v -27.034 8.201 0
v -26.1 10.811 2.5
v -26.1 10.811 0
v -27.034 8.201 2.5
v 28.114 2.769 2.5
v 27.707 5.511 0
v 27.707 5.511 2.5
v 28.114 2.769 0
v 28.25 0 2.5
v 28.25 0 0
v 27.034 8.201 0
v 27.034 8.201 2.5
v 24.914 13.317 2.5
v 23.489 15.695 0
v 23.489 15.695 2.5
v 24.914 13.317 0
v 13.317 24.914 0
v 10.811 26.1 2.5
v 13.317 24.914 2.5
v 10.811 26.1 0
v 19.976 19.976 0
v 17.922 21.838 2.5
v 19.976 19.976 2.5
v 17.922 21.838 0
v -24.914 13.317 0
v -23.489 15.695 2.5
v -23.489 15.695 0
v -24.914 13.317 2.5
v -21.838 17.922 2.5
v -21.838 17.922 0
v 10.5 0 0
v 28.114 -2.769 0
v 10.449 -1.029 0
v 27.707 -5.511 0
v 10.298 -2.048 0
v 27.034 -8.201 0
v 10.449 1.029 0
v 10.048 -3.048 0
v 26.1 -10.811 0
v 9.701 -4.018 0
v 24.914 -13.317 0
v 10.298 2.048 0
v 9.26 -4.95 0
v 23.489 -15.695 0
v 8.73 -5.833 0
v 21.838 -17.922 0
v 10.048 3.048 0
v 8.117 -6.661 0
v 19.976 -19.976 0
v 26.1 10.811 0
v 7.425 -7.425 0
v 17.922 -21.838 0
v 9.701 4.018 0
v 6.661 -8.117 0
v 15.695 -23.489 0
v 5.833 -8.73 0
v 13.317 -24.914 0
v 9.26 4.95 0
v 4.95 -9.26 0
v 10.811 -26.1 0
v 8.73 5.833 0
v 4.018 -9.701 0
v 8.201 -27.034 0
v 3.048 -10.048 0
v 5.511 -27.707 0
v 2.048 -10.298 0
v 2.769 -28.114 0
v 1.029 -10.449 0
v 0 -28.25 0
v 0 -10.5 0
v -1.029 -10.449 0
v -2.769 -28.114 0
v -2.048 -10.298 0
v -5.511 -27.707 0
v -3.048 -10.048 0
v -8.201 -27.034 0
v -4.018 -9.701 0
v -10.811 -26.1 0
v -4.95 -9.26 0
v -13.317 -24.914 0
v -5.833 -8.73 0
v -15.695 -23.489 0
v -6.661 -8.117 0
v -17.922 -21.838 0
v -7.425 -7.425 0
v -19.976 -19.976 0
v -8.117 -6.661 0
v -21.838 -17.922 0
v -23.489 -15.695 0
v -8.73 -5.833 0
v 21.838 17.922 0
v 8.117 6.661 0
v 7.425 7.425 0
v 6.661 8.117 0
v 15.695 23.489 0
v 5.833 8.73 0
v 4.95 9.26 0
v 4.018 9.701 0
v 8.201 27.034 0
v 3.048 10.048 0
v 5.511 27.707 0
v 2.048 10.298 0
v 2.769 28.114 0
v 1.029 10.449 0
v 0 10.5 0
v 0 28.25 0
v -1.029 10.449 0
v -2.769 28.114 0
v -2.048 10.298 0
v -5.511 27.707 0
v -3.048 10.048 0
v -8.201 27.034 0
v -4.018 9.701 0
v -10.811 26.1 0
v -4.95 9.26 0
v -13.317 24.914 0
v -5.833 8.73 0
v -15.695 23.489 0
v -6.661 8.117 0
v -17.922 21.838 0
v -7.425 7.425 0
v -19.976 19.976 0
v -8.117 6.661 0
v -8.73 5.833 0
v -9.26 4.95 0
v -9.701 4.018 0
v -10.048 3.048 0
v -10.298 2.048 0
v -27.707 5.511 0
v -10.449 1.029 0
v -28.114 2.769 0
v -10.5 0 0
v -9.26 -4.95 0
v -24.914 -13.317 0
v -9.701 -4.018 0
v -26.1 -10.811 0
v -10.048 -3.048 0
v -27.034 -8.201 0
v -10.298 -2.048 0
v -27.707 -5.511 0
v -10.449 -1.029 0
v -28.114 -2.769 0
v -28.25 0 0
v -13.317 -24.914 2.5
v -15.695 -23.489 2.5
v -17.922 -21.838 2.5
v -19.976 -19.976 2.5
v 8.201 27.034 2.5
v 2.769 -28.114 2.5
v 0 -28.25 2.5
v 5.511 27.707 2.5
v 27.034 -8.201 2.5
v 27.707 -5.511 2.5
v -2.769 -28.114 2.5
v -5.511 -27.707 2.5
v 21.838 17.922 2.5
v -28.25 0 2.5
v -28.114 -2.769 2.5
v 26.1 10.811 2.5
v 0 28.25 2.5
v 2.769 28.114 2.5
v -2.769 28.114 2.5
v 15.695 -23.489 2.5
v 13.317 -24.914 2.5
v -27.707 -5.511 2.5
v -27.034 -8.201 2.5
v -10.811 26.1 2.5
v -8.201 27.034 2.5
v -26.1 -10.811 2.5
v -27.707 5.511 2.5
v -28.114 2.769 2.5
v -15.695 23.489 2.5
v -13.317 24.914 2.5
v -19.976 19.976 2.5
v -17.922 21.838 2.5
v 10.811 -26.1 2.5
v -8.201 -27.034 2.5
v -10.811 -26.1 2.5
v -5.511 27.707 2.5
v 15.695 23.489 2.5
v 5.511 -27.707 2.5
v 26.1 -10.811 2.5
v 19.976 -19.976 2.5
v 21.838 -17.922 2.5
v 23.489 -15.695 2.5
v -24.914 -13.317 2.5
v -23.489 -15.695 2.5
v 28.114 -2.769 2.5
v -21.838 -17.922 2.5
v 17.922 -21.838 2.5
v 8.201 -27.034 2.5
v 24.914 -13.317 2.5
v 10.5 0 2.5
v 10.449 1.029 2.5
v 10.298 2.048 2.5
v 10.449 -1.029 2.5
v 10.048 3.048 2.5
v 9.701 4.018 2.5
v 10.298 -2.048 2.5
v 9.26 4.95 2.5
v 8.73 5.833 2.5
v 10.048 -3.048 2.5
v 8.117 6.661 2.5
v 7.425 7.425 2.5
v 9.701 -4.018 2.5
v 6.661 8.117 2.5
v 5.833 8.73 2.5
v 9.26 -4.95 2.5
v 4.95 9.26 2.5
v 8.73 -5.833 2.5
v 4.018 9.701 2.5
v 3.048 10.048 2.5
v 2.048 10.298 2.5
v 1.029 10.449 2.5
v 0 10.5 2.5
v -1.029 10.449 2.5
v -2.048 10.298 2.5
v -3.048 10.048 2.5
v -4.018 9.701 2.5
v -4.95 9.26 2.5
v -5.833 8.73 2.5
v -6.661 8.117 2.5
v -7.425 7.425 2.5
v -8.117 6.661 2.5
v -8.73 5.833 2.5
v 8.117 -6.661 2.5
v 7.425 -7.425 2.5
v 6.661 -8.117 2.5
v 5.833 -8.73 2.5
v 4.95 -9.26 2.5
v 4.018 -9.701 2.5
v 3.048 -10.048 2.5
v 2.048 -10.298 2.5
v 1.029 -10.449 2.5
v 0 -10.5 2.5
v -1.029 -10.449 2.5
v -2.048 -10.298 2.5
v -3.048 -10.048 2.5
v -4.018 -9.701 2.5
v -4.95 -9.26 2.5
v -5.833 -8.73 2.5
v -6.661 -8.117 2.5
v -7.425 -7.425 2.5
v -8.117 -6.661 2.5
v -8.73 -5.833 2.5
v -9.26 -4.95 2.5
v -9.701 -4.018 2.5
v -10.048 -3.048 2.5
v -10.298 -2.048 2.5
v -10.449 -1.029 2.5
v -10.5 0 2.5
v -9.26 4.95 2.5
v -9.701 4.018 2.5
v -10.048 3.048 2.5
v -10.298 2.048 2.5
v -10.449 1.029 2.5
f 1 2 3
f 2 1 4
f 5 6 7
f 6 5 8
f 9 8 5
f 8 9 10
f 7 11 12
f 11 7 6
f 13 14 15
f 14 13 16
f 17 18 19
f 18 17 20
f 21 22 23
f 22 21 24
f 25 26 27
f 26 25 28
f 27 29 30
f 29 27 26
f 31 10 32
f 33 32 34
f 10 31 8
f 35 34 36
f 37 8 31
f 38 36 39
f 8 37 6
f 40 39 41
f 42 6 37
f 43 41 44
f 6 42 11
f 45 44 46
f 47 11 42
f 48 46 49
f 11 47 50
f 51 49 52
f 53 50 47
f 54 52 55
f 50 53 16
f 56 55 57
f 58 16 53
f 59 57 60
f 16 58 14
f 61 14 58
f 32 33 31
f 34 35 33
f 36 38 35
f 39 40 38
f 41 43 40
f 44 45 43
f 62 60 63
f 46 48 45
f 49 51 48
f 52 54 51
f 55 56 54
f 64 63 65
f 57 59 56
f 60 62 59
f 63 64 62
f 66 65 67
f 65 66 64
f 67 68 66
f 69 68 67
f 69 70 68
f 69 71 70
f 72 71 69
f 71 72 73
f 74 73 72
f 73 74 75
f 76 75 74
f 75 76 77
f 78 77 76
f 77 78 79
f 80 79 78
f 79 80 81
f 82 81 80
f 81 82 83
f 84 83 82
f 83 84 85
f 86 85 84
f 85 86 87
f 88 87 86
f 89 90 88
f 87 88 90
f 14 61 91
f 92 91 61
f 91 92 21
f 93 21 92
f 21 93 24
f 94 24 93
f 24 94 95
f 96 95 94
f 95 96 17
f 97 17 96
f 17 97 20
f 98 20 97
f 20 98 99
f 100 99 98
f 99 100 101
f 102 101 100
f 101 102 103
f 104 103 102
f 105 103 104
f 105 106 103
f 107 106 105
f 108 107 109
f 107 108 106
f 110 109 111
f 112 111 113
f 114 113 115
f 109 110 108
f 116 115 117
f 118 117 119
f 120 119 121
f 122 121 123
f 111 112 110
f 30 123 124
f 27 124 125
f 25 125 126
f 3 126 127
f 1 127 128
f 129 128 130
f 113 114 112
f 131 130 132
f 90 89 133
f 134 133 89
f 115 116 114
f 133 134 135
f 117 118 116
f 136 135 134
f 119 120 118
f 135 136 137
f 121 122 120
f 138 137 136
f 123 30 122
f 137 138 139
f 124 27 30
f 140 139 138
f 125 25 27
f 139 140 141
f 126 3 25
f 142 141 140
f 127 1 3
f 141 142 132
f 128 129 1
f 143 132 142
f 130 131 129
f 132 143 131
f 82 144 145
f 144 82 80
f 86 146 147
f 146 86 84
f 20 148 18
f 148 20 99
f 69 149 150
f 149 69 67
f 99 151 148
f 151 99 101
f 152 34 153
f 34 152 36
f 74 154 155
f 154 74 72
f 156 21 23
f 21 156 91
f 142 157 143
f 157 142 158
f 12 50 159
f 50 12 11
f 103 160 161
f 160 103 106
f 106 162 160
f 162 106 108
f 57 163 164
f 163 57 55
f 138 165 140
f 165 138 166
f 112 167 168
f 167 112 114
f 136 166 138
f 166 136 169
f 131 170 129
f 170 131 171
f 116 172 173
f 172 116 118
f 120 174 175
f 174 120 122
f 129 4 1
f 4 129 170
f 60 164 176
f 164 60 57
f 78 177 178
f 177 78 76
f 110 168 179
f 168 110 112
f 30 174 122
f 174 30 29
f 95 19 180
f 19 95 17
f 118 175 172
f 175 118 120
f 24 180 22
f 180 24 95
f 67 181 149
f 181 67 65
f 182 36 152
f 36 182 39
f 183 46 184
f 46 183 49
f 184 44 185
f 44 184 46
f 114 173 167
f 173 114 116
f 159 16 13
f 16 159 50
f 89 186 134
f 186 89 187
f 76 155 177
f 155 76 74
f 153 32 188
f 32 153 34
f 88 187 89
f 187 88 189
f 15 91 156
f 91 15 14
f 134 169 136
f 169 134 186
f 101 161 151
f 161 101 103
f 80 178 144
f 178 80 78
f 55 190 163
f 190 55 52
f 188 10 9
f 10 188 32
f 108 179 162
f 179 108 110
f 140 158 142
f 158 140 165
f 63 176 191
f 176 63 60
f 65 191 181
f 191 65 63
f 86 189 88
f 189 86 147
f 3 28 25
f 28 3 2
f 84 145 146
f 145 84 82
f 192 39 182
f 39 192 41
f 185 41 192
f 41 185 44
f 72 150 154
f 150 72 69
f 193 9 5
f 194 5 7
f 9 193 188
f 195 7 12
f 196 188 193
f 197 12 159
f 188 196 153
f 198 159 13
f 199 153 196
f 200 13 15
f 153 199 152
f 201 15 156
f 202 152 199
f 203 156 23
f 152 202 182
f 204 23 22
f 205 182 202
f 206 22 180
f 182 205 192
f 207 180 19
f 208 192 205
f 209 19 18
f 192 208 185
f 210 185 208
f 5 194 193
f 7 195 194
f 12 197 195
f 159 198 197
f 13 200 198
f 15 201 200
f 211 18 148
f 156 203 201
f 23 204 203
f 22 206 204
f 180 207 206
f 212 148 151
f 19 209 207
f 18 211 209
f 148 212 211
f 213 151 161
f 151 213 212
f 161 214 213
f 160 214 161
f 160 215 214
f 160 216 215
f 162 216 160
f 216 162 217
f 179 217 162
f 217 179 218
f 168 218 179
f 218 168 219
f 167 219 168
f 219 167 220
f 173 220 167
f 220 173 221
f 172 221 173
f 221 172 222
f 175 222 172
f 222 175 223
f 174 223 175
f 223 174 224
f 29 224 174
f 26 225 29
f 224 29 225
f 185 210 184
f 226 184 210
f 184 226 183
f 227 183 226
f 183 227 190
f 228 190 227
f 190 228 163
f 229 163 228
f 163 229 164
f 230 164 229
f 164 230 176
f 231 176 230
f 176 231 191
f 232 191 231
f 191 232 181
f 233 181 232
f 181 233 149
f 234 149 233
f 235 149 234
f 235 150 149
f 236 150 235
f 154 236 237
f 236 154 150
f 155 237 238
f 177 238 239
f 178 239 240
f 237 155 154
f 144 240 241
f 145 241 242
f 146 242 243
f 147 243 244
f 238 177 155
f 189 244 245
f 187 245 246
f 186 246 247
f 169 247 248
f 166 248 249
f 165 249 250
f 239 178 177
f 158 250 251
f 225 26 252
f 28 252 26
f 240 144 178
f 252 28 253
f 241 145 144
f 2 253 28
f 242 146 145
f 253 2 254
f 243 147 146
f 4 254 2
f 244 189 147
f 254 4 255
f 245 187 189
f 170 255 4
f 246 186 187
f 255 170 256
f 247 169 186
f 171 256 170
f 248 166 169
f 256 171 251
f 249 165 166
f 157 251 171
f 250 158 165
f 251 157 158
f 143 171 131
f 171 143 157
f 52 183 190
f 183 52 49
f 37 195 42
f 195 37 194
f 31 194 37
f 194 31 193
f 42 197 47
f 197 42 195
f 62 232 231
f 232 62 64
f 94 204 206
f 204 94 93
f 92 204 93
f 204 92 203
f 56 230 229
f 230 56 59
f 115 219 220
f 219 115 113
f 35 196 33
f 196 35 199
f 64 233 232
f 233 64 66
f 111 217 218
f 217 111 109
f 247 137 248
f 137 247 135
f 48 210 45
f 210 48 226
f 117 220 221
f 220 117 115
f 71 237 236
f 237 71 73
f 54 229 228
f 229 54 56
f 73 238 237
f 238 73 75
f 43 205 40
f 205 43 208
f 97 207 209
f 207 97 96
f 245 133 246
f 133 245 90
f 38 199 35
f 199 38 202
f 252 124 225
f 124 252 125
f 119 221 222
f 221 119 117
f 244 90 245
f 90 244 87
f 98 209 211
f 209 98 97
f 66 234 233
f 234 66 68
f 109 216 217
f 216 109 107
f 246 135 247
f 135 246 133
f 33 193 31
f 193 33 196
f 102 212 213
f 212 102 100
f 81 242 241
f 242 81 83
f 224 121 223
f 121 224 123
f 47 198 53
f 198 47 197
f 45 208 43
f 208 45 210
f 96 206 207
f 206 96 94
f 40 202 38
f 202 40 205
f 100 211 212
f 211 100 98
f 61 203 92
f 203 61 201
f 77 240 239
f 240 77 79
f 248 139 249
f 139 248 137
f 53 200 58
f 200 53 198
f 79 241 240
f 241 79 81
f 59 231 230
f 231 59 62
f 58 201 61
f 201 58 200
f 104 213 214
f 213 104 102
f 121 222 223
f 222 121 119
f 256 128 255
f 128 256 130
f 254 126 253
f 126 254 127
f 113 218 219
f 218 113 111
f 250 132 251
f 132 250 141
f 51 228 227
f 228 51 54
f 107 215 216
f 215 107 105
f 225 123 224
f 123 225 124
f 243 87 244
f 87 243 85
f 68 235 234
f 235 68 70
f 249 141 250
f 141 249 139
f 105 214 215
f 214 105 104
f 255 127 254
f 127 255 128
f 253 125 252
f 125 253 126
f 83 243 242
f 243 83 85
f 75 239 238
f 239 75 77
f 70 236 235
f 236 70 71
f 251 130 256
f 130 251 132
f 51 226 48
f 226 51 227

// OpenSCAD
$fn=64;

module
circletext(mytext,textsize=20,myfont="Arial",radius=100,thickness=1,degrees=360,top=true){
       
        chars=len(mytext)+1;
       
        for (i = [1:chars]) {
                        rotate([0,0,(top?1:-1)*(degrees/2-i*(degrees/chars))])
                        translate([0,(top?1:-1)*radius-(top?0:textsize/2),0])
                        //linear_extrude(thickness)
                        text(mytext[i-1],halign="center",font=myfont,size=textsize);
        }
}

height = 2.5;
inner_d = 20;
outer_d = 57.5;
kuttekant = 0.5;

difference() {
    cylinder(h=height,d=outer_d-kuttekant*2);
    cylinder(h=height,d=inner_d+kuttekant*2);
}




//circletext("My text goes here",textsize=20,degrees=160,top=true);

//circletext("Text can be underneath as well",textsize=15,degrees=180,top=false);
